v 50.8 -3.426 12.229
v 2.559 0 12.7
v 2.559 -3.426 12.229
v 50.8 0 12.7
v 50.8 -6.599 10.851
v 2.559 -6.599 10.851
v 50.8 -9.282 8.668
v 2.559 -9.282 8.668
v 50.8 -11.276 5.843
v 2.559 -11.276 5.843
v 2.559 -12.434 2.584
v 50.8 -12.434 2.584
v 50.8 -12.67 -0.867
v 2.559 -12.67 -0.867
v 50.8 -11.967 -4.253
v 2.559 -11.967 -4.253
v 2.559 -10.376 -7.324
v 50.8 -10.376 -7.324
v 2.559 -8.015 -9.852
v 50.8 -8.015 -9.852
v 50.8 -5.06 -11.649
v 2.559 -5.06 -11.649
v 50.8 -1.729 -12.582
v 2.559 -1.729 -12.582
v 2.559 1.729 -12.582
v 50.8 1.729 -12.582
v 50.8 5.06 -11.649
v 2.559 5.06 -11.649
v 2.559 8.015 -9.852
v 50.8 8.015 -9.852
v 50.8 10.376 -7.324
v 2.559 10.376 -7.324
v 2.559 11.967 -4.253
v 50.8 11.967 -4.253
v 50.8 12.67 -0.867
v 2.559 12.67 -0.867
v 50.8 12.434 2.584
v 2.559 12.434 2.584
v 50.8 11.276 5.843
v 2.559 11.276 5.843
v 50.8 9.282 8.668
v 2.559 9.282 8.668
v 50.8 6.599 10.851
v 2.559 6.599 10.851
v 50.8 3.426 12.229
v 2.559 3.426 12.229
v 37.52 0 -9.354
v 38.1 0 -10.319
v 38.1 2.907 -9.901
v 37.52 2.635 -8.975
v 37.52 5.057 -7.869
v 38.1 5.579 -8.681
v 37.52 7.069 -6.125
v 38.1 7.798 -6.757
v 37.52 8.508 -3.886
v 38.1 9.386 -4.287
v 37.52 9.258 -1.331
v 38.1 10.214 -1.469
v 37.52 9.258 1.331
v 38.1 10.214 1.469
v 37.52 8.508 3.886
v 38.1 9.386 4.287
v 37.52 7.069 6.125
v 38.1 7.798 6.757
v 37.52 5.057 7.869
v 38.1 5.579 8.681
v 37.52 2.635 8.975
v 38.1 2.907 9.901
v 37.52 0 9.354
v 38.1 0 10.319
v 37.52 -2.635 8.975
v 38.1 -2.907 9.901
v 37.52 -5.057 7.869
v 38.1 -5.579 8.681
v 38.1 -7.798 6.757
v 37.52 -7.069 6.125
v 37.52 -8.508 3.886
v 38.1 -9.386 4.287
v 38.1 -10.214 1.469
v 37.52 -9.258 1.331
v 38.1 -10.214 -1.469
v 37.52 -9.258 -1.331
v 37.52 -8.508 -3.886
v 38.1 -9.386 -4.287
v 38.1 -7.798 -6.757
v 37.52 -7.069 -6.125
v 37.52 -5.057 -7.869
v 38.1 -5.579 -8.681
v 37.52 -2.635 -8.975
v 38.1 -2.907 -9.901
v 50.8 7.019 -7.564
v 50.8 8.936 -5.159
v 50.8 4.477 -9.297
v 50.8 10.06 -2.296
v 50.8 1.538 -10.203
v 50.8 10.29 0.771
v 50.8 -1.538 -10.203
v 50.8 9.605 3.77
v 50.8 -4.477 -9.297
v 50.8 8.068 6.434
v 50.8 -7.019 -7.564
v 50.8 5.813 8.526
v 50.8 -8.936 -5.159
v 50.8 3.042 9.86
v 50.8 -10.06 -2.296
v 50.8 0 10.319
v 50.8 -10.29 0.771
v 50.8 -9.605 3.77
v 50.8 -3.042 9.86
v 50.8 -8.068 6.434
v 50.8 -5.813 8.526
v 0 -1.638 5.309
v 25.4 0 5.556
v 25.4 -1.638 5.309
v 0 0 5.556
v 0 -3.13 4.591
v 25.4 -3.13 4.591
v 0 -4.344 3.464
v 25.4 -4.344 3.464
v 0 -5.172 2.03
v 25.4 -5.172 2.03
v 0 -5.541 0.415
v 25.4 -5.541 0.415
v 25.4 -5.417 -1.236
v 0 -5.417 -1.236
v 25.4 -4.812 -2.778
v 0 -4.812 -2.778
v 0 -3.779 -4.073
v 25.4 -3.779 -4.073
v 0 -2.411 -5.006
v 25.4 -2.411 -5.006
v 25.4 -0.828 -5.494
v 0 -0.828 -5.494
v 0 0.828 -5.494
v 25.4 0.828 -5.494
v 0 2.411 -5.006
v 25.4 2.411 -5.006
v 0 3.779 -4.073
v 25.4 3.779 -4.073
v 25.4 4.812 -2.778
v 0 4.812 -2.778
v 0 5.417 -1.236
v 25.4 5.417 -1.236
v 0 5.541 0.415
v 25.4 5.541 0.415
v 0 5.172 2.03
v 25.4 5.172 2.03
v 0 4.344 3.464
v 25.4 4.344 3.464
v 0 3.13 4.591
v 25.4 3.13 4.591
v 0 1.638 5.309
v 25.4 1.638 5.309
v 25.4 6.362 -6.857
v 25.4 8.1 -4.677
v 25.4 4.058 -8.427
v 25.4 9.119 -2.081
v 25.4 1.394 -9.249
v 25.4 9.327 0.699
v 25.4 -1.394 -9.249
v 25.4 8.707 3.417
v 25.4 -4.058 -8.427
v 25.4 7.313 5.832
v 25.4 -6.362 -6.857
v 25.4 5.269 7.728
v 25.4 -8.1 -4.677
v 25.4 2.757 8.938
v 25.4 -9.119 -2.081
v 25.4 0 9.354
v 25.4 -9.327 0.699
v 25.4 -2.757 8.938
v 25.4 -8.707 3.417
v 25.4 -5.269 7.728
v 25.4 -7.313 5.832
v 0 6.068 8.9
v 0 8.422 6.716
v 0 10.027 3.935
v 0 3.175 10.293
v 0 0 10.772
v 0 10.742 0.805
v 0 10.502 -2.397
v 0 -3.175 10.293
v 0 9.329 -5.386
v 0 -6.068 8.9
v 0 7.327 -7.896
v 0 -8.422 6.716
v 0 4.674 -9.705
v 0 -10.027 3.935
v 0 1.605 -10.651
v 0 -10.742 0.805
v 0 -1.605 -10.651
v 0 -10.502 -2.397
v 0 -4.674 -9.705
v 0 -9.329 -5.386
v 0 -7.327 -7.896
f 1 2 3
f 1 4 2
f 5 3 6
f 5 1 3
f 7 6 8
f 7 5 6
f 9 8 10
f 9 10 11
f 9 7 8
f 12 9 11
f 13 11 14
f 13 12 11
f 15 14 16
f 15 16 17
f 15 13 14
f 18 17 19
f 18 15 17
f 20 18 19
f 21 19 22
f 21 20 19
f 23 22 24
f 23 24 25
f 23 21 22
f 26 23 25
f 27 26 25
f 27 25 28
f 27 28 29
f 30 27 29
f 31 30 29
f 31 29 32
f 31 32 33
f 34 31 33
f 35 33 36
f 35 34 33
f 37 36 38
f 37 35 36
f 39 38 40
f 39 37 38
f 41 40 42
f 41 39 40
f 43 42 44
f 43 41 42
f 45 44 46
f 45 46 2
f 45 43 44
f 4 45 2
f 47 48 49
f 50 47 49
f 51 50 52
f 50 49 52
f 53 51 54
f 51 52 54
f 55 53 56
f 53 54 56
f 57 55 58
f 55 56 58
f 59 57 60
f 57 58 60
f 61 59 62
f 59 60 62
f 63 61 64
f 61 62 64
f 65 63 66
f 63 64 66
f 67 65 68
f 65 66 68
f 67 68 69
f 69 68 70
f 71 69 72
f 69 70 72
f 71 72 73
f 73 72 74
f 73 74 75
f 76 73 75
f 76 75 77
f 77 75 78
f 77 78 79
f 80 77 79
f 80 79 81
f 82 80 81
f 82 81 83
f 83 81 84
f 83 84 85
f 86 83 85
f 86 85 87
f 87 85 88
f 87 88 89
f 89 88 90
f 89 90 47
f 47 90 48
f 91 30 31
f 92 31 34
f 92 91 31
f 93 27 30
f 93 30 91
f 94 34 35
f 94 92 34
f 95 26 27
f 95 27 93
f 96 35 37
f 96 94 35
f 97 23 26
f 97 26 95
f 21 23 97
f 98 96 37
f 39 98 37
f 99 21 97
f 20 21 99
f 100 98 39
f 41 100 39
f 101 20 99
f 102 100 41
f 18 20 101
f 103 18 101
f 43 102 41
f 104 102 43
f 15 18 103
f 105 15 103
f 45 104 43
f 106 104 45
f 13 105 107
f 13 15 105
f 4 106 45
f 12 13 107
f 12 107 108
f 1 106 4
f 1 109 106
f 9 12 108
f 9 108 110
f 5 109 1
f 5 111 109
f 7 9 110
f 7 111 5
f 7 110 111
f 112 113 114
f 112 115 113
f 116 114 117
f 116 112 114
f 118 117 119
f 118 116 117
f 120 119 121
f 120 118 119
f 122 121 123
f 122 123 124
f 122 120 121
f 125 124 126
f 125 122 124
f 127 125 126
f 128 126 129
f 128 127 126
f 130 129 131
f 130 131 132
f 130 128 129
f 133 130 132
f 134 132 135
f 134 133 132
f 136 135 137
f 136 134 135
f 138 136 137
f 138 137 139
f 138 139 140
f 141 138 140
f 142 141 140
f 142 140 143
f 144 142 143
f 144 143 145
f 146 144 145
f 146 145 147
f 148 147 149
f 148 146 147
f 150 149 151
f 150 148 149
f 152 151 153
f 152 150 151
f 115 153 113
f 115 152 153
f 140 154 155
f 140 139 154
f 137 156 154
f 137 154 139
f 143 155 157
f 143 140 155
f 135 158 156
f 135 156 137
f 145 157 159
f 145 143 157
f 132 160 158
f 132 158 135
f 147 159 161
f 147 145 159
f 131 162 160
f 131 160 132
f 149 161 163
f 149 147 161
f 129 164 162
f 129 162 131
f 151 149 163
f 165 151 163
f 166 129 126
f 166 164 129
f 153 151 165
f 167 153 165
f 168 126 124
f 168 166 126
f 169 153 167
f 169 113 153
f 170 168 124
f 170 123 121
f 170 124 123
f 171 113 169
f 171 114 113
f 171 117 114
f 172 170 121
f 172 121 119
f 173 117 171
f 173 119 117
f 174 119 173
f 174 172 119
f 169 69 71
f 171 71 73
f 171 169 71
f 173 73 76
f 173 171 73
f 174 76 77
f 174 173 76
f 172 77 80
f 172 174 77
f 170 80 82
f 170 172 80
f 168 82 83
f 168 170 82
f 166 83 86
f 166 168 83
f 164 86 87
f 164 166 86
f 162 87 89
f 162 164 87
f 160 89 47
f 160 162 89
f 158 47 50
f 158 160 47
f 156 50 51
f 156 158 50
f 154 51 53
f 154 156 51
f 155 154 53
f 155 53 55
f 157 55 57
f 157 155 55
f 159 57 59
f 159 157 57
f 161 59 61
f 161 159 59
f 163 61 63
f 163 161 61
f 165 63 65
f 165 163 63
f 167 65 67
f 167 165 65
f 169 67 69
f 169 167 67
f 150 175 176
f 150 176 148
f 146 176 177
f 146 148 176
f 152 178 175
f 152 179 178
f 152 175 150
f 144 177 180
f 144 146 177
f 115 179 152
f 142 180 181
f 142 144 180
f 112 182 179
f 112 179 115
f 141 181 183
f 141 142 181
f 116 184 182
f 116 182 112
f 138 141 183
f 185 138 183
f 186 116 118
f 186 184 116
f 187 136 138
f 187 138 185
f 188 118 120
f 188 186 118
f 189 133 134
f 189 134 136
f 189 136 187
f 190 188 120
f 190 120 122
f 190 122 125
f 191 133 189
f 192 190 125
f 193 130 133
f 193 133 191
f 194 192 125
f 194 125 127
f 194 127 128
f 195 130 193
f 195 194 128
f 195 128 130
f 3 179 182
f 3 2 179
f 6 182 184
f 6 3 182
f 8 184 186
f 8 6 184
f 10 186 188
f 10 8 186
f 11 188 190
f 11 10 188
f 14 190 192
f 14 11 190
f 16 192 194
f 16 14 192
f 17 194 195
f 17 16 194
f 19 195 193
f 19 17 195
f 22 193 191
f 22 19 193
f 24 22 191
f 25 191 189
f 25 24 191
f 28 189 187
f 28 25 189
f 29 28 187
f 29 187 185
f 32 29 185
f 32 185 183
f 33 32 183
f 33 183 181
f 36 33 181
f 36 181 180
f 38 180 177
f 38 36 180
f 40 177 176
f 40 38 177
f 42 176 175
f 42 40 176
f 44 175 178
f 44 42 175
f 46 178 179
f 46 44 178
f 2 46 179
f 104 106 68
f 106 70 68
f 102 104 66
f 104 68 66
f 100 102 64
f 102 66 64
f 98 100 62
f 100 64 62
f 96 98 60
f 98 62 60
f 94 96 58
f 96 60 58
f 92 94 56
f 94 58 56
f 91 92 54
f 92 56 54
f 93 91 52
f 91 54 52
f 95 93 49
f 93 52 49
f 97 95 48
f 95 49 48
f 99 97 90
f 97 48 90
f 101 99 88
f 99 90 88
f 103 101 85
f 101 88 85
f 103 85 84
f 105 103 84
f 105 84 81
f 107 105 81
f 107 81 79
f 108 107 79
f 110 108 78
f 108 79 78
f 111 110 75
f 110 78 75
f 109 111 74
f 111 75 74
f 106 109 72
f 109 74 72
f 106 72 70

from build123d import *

# Parameters (mm, degrees)
F_7_8_14_TAPPED_HOLE1_D     = 20.6375
F_7_8_14_TAPPED_HOLE1_DEPTH = 12.7
F_7_8_14_TAPPED_HOLE1_TIP   = 6.200130513


with BuildPart() as part:
    # Sketch2 → Revolve1 (revolve)
    with BuildSketch(Plane.XY, mode=Mode.PRIVATE) as revolve1_sk:
        Polygon((0, 10.771663062), (2.558989547, 12.7), (50.8, 12.7), (50.8, 9.35355), (25.4, 9.35355), (25.4, 5.55625), (0, 5.55625), align=None)
    revolve(revolve1_sk.sketch.rotate(Axis((0, 0, 0), (1, 0, 0)), 90), axis=Axis((0, 0, 0), (1, 0, 0)))

    # 7/8-14 Tapped Hole1
    with Locations(Plane(origin=(50.8, 0, 0), x_dir=(0, 0, -1), z_dir=(1, 0, 0))):
        with Locations((0, 0)):
            Hole(F_7_8_14_TAPPED_HOLE1_D / 2, depth=F_7_8_14_TAPPED_HOLE1_DEPTH)
            with Locations((0, 0, -(F_7_8_14_TAPPED_HOLE1_DEPTH + F_7_8_14_TAPPED_HOLE1_TIP / 2))):  # 118° drill point
                Cone(0, F_7_8_14_TAPPED_HOLE1_D / 2, F_7_8_14_TAPPED_HOLE1_TIP, mode=Mode.SUBTRACT)


solid = part.part
